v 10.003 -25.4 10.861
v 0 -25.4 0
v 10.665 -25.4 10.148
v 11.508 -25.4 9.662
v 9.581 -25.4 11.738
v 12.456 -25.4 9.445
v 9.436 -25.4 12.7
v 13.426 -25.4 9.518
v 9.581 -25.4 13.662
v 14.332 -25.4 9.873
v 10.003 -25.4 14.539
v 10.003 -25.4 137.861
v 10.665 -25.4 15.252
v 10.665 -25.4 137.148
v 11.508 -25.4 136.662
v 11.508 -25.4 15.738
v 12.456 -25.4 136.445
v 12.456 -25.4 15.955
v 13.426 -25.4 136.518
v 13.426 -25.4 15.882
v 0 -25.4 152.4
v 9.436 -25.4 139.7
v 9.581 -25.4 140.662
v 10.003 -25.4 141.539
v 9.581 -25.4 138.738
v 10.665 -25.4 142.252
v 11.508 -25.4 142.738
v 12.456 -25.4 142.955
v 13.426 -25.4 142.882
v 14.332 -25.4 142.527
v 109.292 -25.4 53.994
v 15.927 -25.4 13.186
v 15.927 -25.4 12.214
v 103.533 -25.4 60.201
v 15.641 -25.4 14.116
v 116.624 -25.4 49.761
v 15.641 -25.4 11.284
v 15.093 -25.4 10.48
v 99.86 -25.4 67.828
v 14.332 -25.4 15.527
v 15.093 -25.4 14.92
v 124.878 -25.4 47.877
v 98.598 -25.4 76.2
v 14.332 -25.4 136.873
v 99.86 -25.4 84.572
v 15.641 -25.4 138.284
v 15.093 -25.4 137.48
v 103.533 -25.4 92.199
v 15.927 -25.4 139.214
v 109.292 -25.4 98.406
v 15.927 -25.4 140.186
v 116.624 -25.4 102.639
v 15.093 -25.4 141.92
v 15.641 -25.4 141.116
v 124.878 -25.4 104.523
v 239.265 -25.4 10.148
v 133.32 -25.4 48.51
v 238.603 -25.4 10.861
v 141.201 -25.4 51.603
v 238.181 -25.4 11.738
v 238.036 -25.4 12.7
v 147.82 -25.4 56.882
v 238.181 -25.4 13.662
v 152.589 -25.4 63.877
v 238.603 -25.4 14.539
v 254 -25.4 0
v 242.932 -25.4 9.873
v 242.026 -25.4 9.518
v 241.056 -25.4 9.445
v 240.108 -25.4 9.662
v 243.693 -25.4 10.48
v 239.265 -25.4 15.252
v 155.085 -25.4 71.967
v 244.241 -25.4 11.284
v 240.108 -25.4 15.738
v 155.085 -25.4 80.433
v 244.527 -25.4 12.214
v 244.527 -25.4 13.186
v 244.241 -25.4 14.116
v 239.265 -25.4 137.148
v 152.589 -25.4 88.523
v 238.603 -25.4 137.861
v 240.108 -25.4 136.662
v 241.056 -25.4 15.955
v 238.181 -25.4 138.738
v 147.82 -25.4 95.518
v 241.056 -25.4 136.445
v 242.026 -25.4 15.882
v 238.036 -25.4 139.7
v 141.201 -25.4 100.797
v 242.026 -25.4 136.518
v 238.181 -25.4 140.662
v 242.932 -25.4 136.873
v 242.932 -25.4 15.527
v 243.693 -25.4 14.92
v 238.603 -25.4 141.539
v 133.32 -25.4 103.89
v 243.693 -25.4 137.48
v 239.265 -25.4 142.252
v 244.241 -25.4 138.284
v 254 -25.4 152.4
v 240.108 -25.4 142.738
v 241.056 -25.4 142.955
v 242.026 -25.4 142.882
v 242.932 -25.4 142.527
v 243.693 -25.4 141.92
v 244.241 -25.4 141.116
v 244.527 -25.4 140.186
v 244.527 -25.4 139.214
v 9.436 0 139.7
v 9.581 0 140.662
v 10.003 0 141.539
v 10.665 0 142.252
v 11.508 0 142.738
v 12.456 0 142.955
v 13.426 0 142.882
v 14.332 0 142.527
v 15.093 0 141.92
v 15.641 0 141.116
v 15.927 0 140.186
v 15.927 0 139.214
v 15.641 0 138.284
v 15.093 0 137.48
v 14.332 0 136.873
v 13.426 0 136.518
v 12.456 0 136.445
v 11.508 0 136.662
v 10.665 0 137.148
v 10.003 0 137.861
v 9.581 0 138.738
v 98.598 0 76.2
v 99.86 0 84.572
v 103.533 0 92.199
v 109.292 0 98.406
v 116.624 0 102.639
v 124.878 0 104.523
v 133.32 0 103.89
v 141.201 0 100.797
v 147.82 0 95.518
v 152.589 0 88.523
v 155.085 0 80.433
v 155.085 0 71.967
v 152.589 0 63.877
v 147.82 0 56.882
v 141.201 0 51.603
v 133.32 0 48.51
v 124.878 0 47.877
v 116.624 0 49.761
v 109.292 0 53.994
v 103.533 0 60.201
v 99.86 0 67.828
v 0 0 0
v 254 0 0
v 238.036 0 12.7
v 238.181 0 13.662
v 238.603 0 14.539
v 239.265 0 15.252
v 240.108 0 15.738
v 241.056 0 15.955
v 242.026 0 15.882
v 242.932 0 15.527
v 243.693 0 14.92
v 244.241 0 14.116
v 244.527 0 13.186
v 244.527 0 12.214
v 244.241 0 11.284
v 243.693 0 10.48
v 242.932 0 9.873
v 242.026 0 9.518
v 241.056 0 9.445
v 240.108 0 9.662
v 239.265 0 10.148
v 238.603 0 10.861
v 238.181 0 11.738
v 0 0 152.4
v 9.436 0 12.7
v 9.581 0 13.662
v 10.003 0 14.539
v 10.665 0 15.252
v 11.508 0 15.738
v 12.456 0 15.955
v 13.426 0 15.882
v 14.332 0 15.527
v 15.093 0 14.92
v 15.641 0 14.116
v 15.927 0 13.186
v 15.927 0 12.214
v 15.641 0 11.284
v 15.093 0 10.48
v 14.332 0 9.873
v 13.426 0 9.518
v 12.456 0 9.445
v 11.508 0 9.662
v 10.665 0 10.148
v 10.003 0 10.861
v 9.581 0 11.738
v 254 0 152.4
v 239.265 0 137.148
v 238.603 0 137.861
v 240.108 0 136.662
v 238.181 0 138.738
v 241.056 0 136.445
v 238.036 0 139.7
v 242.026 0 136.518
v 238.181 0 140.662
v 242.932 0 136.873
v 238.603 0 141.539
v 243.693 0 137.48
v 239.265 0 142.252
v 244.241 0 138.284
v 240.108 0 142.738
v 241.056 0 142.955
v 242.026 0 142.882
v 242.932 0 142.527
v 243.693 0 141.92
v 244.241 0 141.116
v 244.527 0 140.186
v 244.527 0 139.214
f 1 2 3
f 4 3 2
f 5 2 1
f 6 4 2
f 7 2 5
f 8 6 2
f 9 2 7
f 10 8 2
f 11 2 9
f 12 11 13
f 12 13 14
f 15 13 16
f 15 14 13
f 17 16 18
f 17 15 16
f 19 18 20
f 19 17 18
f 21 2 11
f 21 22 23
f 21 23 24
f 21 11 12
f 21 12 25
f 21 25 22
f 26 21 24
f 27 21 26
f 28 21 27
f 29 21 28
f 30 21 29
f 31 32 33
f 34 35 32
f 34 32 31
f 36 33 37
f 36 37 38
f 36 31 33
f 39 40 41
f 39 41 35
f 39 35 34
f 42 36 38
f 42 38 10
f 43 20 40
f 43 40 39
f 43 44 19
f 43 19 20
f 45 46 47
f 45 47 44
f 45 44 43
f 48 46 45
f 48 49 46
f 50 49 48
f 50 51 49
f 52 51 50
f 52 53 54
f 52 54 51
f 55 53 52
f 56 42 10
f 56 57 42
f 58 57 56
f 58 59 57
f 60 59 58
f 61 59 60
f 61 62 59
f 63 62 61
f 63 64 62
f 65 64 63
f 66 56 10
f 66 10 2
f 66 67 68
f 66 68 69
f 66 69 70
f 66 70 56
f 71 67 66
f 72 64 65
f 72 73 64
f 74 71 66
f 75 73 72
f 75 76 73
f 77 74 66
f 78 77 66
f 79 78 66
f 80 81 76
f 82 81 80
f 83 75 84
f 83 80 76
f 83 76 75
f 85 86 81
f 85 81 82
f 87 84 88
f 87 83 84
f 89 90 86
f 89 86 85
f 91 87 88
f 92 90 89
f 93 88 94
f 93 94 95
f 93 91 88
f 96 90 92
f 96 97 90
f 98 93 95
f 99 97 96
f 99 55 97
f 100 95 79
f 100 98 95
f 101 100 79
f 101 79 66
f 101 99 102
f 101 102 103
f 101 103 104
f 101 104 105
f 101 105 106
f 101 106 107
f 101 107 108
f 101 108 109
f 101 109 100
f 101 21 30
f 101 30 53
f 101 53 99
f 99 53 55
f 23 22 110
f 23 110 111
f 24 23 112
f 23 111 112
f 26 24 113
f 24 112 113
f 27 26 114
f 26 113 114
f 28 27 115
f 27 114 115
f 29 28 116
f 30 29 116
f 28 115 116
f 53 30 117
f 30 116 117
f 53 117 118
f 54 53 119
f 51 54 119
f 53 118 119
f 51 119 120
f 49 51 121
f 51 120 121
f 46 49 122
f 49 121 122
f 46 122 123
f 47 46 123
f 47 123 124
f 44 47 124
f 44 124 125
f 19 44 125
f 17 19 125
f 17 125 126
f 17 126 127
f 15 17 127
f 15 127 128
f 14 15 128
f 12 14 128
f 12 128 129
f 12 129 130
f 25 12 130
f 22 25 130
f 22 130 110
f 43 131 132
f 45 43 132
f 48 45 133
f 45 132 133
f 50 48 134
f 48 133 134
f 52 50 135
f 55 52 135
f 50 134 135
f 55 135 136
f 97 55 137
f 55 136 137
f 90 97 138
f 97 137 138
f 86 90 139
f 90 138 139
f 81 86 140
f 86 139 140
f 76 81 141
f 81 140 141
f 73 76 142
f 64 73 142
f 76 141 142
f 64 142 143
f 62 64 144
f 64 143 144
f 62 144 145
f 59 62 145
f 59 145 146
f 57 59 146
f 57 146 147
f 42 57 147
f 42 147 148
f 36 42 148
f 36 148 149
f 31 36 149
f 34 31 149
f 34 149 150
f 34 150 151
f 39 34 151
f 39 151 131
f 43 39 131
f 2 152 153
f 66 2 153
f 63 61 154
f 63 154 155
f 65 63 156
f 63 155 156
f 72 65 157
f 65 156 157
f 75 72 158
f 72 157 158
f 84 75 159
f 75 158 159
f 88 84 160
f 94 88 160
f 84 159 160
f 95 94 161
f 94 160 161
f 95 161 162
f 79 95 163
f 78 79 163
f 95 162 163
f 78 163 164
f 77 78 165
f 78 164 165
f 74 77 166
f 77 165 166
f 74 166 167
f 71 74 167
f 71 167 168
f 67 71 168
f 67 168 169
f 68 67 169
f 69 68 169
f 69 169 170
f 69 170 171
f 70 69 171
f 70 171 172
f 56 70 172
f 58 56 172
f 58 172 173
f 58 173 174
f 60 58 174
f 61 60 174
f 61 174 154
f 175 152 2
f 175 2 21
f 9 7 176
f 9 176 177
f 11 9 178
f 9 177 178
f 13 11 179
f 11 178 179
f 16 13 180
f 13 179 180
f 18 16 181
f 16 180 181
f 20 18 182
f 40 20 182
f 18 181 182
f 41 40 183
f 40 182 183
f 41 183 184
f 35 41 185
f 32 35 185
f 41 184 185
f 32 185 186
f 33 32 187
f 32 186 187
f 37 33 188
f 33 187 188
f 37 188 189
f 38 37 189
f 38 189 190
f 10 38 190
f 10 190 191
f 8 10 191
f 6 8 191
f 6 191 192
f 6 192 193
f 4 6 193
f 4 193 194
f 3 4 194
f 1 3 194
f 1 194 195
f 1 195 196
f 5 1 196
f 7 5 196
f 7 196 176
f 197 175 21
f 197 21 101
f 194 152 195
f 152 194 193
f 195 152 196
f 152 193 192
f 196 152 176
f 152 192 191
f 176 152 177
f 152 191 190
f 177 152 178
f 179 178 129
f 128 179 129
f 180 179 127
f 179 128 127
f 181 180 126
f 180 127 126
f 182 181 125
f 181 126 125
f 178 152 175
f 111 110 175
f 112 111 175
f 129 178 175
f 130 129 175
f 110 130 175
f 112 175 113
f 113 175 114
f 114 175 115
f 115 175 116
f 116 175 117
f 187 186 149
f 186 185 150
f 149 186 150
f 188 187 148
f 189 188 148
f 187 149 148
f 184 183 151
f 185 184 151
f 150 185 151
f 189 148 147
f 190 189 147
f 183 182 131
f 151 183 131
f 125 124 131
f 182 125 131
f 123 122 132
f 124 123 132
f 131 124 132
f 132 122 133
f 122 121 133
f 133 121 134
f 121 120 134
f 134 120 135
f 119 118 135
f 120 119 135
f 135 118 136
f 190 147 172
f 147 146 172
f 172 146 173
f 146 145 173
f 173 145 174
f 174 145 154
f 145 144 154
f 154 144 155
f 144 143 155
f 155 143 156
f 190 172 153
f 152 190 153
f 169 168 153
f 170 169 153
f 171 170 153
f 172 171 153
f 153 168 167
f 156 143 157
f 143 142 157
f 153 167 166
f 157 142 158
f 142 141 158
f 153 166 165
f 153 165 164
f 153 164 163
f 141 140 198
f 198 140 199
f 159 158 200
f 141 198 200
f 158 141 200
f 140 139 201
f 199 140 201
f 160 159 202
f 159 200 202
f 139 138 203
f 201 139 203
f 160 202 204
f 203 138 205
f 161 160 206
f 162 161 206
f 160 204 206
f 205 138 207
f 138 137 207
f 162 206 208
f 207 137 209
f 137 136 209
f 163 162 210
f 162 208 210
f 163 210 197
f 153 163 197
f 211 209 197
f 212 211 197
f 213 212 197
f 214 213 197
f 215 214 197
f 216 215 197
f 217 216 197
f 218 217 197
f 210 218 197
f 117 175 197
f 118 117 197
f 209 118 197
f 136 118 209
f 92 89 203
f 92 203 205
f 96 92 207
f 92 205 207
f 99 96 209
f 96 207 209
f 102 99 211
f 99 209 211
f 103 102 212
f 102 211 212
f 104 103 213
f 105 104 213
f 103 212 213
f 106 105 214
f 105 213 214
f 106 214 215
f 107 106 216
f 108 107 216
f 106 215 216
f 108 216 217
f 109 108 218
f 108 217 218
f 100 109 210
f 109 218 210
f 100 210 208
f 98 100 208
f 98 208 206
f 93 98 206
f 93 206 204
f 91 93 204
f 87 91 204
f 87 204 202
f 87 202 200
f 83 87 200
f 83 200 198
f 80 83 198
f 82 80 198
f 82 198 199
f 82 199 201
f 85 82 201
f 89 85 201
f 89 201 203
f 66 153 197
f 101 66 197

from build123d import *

# Parameters (mm, degrees)
F0_W     = 254
F0_H     = 152.4
F1_DEPTH = 25.4
F3_D     = 6.5278
F4_R     = 28.401981162
F5_DEPTH = 25.401


with BuildPart() as f1:
    # F0 (on Front) → F1 (new body)
    with BuildSketch(Plane.XZ):
        with Locations((127, 76.2)):
            Rectangle(F0_W, F0_H)
    extrude(amount=F1_DEPTH)

    # F3 (through all)
    with Locations(Plane.XZ.offset(25.4)):
        with Locations((12.7, 139.7), (241.3, 139.7), (241.3, 12.7), (12.7, 12.7)):
            Hole(F3_D / 2)

    # F4 (on face) → F5 (cut, through all)
    with BuildSketch(Plane(origin=(0, 0, 0), x_dir=(-1, 0, 0), z_dir=(0, 1, 0))):
        with Locations((-127, 76.2)):
            Circle(F4_R)
    extrude(amount=-F5_DEPTH, mode=Mode.SUBTRACT)


solid = f1.part
